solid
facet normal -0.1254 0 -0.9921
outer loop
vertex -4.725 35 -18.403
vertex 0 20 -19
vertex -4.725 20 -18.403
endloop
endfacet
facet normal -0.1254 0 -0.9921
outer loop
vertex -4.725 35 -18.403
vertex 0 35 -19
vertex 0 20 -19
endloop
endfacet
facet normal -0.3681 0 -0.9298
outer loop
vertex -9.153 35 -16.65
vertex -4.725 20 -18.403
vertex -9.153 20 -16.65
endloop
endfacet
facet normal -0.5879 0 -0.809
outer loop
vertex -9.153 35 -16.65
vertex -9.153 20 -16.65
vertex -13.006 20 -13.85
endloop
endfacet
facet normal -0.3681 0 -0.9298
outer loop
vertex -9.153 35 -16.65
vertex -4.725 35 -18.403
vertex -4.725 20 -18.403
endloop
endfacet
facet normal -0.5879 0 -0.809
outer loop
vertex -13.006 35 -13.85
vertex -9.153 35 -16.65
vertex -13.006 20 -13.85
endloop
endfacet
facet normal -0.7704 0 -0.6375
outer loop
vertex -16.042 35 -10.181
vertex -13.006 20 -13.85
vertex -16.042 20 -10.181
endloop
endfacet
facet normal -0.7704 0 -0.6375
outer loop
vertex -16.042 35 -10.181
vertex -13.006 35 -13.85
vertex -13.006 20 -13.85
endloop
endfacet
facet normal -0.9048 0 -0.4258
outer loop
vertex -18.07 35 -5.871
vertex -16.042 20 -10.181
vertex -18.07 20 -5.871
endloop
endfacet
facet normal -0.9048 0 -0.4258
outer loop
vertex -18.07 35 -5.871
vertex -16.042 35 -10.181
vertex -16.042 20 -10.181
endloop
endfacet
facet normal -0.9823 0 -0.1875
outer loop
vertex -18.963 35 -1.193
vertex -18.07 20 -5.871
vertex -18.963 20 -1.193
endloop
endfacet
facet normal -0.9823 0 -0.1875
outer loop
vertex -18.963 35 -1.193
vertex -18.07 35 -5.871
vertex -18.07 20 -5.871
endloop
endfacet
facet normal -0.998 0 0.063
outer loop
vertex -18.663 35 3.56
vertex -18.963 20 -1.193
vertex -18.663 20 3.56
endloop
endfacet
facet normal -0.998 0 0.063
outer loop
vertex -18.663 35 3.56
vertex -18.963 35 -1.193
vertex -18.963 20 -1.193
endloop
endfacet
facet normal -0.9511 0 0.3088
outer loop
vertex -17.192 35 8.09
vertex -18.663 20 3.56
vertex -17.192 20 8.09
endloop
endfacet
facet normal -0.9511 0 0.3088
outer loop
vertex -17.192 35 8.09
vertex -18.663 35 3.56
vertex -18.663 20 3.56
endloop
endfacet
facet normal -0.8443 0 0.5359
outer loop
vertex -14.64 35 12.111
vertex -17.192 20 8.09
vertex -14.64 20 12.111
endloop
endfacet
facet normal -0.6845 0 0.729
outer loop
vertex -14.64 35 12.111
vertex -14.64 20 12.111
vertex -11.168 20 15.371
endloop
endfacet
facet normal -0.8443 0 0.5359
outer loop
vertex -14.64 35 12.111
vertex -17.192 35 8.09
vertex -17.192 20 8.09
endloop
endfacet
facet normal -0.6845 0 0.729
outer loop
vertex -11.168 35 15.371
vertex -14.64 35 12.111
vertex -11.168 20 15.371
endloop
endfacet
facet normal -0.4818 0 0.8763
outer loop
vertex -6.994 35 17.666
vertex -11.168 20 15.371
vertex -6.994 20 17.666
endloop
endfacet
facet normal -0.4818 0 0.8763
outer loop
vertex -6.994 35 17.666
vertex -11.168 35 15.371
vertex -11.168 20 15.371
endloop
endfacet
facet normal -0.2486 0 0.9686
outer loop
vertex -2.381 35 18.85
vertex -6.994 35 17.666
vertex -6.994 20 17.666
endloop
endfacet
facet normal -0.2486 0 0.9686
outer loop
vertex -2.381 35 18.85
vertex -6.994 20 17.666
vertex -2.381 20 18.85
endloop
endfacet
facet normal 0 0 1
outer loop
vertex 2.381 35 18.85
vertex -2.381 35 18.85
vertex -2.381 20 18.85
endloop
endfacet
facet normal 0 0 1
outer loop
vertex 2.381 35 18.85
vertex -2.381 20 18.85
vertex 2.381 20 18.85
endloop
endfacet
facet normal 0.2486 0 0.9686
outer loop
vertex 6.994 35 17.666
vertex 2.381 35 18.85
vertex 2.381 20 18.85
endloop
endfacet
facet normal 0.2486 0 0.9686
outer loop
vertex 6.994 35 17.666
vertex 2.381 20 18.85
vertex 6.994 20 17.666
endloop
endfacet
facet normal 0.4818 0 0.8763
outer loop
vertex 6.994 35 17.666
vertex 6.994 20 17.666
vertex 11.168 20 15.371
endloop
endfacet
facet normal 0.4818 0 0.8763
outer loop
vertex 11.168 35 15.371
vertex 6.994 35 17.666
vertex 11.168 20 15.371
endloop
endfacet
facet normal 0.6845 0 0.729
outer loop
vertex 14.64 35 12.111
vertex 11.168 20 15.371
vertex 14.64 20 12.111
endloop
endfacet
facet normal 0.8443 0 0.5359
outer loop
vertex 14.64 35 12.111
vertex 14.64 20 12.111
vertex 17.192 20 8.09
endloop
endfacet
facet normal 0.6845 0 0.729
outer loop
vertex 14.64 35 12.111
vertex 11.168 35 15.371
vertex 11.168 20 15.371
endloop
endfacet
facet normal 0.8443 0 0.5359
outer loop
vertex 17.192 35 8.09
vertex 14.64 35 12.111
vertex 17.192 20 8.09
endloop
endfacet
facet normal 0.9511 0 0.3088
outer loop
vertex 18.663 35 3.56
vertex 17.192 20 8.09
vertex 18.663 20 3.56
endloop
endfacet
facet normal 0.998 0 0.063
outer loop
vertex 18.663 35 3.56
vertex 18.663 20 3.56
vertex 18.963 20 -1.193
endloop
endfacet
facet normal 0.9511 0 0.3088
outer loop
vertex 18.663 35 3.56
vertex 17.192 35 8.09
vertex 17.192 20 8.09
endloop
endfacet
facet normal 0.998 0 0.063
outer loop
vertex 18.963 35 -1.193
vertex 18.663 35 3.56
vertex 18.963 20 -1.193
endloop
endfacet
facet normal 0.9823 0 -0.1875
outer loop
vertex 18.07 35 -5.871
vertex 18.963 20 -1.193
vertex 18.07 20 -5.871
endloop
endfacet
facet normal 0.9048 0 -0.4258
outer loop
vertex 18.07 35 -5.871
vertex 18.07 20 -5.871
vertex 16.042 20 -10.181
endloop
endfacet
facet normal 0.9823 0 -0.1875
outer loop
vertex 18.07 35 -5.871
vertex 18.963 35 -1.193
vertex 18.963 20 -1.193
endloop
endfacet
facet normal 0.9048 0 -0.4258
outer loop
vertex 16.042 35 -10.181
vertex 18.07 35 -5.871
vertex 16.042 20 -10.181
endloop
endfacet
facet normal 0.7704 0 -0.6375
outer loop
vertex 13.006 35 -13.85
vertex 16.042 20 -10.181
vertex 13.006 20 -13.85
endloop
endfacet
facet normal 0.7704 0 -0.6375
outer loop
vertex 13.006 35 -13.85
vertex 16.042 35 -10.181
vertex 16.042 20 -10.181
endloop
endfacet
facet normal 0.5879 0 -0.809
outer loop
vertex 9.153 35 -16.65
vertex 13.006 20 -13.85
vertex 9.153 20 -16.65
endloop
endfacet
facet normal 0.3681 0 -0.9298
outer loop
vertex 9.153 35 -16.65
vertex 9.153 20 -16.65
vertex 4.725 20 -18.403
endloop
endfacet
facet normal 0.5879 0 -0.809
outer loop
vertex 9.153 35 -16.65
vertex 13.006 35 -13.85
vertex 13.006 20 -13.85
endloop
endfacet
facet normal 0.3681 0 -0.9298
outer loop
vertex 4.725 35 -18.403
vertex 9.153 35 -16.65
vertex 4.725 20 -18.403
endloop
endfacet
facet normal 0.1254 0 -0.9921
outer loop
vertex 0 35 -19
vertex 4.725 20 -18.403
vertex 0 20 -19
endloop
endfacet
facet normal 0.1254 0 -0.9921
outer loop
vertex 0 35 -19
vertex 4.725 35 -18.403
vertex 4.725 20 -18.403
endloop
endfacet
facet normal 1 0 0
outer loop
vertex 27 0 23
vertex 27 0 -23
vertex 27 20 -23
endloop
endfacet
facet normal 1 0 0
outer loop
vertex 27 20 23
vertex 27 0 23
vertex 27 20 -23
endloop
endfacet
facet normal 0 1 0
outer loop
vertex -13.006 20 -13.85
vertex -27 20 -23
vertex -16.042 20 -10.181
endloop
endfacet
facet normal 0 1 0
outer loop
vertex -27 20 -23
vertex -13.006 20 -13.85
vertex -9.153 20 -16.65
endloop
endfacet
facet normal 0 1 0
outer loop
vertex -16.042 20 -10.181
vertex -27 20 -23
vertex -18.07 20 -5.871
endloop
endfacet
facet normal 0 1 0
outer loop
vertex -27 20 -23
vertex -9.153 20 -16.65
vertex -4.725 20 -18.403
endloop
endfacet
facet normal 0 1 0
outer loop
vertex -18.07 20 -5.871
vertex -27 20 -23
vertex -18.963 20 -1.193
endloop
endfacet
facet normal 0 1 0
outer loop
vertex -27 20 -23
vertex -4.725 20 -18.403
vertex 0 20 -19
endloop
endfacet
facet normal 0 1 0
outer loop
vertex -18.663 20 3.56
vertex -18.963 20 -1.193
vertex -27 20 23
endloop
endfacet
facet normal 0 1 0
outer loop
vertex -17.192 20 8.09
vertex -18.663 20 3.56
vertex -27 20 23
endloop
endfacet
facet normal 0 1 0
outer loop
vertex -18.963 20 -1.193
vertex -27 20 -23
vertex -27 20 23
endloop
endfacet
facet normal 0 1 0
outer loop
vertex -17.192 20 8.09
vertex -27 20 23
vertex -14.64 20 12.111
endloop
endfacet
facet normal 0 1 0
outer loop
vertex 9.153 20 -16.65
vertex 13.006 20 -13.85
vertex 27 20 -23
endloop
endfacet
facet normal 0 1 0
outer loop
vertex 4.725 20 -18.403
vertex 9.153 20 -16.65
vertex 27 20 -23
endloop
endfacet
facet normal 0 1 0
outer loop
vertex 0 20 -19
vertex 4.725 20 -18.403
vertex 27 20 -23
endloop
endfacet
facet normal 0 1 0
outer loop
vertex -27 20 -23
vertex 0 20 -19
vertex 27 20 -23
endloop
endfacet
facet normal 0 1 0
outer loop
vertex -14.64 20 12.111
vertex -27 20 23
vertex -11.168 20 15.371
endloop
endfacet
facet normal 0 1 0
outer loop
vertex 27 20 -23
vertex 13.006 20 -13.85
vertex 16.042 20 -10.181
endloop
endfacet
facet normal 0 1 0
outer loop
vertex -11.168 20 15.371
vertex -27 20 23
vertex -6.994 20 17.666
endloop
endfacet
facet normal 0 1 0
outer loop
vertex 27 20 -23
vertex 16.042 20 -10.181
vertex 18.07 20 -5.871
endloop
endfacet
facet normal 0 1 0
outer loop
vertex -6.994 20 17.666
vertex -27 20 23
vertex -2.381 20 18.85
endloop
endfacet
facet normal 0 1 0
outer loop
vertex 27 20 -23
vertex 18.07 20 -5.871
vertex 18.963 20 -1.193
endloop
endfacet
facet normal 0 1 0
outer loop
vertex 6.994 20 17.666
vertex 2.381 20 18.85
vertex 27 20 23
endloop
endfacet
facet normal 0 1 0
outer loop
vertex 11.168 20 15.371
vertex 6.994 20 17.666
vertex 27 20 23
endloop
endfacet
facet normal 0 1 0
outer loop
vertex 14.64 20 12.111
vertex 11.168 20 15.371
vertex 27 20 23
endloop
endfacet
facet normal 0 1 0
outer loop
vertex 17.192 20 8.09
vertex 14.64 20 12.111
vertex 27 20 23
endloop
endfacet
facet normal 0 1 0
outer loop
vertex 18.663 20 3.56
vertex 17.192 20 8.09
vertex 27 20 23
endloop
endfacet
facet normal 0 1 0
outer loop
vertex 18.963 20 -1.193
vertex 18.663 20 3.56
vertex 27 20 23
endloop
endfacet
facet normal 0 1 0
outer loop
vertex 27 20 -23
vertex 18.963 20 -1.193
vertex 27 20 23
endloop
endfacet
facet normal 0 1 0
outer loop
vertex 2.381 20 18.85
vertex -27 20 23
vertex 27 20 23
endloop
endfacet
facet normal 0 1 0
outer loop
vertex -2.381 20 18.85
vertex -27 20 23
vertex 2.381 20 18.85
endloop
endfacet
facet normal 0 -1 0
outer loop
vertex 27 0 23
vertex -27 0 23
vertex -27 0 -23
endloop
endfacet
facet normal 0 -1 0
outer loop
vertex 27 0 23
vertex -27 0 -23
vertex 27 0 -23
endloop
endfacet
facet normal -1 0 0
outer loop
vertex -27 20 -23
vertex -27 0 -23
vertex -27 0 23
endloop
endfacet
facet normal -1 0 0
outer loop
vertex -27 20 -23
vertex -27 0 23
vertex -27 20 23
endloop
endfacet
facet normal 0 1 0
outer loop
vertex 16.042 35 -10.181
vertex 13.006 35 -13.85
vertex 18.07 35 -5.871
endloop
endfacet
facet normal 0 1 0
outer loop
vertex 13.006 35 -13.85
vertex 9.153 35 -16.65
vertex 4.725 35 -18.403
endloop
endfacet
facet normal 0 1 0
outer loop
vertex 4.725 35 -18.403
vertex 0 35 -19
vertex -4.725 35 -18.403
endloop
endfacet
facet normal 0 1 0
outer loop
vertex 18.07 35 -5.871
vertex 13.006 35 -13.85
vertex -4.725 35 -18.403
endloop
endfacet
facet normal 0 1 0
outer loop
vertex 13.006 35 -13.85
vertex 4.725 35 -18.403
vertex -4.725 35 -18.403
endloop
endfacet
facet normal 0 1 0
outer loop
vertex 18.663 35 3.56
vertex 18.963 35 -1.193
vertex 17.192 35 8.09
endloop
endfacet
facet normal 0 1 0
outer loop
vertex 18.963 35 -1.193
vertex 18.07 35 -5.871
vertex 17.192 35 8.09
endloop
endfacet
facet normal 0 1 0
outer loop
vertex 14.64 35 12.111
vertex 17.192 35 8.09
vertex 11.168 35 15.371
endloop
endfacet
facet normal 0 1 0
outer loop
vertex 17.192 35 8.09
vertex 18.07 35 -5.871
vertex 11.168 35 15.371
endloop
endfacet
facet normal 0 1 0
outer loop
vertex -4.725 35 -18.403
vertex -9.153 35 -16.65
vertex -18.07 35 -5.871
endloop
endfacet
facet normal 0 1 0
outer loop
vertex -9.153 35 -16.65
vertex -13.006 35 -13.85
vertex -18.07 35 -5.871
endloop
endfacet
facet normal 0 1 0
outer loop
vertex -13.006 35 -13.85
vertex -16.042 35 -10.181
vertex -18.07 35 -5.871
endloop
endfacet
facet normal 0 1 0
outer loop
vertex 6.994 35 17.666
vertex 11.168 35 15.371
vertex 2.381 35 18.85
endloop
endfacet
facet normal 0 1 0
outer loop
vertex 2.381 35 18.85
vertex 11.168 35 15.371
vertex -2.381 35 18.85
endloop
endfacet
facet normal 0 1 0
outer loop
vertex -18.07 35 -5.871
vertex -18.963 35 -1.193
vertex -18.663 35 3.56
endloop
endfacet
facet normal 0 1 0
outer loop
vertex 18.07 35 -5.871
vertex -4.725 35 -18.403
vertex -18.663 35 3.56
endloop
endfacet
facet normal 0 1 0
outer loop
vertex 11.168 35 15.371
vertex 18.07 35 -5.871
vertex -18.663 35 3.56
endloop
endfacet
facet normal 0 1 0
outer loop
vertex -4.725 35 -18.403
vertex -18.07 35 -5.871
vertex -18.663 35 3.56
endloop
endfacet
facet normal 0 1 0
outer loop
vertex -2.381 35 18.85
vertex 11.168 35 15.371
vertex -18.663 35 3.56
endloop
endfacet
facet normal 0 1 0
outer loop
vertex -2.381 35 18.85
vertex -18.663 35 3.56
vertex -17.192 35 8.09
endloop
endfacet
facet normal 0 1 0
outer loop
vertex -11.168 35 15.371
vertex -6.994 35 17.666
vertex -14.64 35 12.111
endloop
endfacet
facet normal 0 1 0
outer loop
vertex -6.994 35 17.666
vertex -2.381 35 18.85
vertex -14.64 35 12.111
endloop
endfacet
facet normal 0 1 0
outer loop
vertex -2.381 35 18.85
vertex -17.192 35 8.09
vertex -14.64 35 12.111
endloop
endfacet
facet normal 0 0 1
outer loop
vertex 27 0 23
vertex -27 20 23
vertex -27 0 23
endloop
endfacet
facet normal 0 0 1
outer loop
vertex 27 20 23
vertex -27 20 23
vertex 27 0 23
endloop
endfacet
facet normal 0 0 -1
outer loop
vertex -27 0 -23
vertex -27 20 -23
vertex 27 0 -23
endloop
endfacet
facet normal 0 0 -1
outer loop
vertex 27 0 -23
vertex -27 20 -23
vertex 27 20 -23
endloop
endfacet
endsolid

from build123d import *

# Parameters (mm, degrees)
SK_BASE_W  = 54
SK_BASE_H  = 20
BASE_DEPTH = 23
SK_HEAD_W  = 19
SK_HEAD_H  = 15


with BuildPart() as part:
    # SK_Base → Base (new, symmetric)
    with BuildSketch(Plane.XY):
        with Locations((0, 10)):
            Rectangle(SK_BASE_W, SK_BASE_H)
    extrude(amount=BASE_DEPTH, both=True)

    # SK_Head → Head (revolve)
    with BuildSketch(Plane.XY, mode=Mode.PRIVATE) as head_sk:
        with Locations((9.5, 27.5)):
            Rectangle(SK_HEAD_W, SK_HEAD_H)
    revolve(head_sk.sketch.rotate(Axis((0, 15, 0), (0, 1, 0)), 90), axis=Axis((0, 15, 0), (0, 1, 0)))


solid = part.part
